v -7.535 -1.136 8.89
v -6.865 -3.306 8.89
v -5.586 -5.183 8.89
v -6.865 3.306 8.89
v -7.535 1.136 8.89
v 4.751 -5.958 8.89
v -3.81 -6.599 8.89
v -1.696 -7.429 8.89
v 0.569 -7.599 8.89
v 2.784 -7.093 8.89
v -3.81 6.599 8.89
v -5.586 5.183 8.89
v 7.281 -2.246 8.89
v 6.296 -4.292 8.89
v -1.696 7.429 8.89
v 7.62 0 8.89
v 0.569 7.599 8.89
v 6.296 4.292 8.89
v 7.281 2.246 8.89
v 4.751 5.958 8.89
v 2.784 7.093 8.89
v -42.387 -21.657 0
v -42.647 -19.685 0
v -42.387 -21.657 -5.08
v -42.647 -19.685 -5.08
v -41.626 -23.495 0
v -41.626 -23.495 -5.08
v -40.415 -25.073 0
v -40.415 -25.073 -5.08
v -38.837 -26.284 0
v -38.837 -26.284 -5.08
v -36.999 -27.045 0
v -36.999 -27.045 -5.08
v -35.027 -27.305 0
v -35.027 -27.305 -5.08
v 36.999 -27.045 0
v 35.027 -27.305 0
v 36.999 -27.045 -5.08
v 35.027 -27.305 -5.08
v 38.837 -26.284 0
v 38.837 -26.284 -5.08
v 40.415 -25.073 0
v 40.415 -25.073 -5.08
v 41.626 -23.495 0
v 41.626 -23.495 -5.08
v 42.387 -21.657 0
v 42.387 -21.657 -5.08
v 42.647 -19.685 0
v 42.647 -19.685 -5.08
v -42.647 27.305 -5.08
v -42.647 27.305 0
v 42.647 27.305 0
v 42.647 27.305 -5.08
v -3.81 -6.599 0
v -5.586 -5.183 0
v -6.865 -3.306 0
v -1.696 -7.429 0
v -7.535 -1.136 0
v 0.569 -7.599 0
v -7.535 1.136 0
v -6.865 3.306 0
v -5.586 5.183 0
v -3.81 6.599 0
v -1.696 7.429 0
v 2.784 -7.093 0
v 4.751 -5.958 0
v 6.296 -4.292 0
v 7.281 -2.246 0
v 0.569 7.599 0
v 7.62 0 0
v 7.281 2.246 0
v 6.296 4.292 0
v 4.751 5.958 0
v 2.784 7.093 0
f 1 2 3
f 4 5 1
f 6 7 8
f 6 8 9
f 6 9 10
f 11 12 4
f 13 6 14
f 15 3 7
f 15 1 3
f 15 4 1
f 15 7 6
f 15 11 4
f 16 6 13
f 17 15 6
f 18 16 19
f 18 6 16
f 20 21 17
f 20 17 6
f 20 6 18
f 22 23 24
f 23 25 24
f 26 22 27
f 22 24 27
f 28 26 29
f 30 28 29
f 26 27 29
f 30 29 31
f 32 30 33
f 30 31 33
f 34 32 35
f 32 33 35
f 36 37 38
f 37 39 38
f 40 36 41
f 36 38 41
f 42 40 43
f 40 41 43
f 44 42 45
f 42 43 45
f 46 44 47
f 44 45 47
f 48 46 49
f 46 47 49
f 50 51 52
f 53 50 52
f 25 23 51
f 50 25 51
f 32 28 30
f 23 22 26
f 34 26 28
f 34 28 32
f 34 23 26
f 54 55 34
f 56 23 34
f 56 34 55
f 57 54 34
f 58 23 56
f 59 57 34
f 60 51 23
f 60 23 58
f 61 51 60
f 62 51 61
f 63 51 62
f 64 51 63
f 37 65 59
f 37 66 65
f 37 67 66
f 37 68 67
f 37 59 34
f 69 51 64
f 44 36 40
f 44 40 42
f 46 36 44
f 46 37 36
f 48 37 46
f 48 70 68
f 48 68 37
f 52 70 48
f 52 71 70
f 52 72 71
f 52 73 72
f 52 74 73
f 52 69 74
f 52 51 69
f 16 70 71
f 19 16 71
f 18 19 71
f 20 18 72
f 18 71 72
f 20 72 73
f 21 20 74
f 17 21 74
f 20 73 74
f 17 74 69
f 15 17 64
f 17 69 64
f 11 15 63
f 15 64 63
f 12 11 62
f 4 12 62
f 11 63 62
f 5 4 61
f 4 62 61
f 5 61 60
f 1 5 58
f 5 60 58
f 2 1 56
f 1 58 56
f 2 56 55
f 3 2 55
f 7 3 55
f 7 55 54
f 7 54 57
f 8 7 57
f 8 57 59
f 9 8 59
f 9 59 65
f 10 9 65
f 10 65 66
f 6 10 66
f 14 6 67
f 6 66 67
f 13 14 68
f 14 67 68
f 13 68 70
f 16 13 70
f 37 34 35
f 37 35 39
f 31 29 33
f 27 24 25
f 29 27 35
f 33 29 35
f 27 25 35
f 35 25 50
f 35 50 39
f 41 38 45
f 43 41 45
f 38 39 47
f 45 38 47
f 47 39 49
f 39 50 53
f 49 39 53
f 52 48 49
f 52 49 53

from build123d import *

# Parameters (mm, degrees)
F0_R     = 7.62
F1_DEPTH = 8.89
F0_W     = 85.2932
F0_H     = 54.61
F2_DEPTH = 5.08
F3_R     = 7.62


with BuildPart() as f1:
    # F0 (on Top) → F1 (new body)
    with BuildSketch(Plane.XY):
        Circle(F0_R)
    extrude(amount=F1_DEPTH)

    # F0 (on Top) → F2 (join)
    with BuildSketch(Plane.XY):
        Rectangle(F0_W, F0_H)
        Circle(F0_R, mode=Mode.SUBTRACT)
        Circle(F0_R)
    extrude(amount=-F2_DEPTH)

    # F3
    f3_edges = [f1.edges().sort_by_distance(p)[0] for p in [
        (42.6466, -27.305, -2.54),
        (-42.6466, -27.305, -2.54),
    ]]
    fillet(f3_edges, radius=F3_R)


solid = f1.part
